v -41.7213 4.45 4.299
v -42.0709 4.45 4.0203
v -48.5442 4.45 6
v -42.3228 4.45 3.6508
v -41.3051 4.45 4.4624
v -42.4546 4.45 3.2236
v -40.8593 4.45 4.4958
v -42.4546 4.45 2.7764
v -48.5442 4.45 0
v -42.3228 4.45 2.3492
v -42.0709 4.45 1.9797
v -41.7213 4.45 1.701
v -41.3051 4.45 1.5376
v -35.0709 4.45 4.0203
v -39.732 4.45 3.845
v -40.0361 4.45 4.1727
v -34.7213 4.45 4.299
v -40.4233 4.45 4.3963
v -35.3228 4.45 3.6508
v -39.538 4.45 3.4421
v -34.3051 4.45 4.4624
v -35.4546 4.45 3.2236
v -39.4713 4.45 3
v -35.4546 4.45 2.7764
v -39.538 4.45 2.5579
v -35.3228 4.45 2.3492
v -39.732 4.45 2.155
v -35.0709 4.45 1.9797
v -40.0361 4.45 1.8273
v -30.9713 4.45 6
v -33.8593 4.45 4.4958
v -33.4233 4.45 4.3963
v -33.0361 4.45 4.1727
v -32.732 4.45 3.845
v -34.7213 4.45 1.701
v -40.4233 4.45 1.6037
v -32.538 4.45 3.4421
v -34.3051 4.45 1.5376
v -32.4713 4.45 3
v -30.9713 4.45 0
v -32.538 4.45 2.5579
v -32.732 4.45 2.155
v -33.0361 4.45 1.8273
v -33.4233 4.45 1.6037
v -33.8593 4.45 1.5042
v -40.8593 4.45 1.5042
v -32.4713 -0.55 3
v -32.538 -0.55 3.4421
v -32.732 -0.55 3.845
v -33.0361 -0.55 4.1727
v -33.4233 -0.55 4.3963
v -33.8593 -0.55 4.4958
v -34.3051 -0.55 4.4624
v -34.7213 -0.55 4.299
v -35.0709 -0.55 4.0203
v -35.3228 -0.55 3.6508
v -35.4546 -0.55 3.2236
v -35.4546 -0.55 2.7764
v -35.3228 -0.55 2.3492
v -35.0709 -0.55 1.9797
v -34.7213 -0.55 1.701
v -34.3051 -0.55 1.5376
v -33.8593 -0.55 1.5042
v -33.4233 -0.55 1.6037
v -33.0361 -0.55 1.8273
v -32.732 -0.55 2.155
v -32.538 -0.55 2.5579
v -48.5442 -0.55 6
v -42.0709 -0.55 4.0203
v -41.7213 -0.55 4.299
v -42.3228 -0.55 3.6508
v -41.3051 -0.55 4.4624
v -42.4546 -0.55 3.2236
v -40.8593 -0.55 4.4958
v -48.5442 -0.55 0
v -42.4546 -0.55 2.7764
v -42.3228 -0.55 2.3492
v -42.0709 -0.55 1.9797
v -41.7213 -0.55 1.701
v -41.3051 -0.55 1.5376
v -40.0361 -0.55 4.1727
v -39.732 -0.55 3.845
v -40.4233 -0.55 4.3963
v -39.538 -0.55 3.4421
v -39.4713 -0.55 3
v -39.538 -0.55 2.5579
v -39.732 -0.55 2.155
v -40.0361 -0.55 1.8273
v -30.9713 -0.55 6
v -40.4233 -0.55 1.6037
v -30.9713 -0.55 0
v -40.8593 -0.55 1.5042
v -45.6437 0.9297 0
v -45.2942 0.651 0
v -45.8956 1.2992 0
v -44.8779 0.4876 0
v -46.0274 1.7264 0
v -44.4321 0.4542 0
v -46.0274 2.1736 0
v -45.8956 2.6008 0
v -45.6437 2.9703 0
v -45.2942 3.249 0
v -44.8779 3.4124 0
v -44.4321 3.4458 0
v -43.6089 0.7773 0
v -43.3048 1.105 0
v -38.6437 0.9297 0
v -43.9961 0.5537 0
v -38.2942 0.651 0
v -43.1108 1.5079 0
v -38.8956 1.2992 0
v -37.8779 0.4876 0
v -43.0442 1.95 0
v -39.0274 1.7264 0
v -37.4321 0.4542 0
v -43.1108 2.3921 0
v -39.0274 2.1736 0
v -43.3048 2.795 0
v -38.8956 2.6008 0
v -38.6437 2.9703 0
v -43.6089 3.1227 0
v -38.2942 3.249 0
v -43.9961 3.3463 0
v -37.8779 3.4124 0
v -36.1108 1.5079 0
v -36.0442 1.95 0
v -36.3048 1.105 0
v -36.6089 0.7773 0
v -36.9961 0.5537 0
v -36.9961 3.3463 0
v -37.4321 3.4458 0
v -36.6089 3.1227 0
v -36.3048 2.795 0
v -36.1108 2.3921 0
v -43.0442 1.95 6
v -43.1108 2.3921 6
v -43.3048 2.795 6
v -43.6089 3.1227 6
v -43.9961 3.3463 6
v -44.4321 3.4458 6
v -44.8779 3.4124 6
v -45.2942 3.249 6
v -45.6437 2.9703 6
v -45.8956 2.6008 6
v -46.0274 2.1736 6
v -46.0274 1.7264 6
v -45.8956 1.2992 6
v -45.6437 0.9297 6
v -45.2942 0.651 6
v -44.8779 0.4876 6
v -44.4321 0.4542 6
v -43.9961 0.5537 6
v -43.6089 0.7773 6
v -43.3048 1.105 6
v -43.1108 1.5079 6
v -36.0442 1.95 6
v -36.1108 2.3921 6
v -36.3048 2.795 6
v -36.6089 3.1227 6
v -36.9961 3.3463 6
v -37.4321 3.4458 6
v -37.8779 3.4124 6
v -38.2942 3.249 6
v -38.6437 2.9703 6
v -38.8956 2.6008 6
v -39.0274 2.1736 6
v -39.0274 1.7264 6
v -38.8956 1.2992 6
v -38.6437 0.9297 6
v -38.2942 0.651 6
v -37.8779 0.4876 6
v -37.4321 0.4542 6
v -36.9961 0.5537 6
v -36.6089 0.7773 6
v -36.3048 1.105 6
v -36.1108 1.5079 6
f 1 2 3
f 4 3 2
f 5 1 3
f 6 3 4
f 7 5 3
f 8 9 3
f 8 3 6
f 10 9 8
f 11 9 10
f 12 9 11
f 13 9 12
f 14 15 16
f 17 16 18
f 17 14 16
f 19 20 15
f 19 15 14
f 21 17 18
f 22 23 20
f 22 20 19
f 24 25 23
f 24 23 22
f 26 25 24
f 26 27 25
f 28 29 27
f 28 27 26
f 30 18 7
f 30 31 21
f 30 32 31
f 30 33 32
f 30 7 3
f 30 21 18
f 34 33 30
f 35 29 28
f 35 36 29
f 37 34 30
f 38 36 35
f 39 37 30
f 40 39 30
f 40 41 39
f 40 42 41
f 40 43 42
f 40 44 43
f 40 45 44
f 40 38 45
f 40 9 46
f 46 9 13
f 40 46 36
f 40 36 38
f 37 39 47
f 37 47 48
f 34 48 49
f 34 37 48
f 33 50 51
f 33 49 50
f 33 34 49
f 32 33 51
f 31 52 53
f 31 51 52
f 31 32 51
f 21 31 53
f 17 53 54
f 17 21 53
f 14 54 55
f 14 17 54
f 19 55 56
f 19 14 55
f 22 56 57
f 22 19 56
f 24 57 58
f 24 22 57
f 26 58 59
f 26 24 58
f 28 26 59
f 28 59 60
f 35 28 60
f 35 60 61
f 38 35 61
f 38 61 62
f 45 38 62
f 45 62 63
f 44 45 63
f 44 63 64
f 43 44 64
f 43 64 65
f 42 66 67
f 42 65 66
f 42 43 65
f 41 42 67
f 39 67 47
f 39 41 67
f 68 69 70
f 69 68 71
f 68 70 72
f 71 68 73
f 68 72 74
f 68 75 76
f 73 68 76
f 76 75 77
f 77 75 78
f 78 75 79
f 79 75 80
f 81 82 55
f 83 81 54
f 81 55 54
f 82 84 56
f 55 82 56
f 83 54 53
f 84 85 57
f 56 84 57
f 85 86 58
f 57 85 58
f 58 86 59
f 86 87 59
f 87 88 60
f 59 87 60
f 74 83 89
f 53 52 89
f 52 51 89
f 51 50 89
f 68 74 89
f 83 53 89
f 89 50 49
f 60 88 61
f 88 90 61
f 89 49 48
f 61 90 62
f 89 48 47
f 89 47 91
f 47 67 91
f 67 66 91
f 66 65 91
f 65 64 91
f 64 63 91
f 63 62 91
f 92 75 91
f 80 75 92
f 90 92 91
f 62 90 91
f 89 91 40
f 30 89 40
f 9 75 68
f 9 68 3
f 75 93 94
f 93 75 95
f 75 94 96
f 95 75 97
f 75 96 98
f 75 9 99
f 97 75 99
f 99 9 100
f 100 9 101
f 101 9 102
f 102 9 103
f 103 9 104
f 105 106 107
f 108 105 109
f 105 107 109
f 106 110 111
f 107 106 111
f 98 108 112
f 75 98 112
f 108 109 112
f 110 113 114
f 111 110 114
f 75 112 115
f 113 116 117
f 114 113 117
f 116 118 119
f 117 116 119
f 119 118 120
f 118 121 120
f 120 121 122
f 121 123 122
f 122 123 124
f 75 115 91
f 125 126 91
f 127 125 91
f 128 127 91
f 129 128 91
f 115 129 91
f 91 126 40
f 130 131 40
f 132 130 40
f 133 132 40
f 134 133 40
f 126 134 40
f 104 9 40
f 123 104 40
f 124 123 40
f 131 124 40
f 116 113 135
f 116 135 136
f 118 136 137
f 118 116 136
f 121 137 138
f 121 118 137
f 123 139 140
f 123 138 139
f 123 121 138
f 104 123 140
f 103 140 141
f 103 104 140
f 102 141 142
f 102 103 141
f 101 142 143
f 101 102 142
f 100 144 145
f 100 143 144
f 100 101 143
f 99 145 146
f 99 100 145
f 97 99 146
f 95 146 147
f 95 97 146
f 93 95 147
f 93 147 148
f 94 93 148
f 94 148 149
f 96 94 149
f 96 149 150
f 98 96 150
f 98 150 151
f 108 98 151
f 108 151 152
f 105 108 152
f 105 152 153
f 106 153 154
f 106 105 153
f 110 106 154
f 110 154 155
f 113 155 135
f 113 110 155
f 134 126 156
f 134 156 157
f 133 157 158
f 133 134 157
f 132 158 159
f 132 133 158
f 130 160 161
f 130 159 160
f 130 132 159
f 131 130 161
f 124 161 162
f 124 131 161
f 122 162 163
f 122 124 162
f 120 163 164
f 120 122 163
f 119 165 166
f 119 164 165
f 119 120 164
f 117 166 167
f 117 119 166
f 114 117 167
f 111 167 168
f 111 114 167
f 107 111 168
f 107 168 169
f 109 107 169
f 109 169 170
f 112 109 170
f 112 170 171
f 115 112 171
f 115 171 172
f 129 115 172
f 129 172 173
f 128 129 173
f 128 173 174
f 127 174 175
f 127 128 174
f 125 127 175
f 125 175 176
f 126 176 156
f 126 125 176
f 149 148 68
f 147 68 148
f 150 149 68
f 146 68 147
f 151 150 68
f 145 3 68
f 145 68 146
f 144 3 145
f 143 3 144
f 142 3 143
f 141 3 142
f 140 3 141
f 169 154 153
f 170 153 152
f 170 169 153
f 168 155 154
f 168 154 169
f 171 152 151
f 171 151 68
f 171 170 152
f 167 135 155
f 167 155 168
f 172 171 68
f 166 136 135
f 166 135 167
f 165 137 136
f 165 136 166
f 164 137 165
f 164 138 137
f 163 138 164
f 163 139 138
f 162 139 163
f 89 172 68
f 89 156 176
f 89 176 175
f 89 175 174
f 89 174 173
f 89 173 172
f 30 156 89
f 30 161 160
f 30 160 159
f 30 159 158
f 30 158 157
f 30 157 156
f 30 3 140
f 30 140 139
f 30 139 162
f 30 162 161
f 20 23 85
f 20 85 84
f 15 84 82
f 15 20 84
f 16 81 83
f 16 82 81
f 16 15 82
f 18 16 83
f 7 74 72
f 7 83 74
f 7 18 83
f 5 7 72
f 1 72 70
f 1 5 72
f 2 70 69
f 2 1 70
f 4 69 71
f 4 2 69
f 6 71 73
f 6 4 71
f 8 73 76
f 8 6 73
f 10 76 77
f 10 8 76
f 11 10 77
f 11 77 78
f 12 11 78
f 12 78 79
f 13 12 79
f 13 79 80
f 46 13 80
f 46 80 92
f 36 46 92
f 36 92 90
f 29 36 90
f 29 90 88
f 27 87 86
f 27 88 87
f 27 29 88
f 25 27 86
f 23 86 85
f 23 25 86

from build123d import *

# Parameters (mm, degrees)
SKETCH_5_W               = 17.572810229
SKETCH_5_H               = 5
EXTRUDE_1_DEPTH          = 6
CUT_EXTRUDE_1_DEPTH      = 50.115553238
CUT_EXTRUDE_1_DEPTH_BACK = 50.115553238
SKETCH_6_R               = 1.5
CUT_EXTRUDE_2_DEPTH      = 50.168435707
CUT_EXTRUDE_2_DEPTH_BACK = 50.168435707
SKETCH_7_R               = 1.5


with BuildPart() as part:
    # 草图5 → 凸台-拉伸1 (new body)
    with BuildSketch(Plane.XY):
        with Locations((-39.757750763, 1.95)):
            Rectangle(SKETCH_5_W, SKETCH_5_H)
    extrude(amount=EXTRUDE_1_DEPTH)

    # 草图6 → 切除-拉伸1 (cut, two sides: drawn at the far end of the back side and taken through both)
    with BuildSketch(Plane.XY.offset(6).offset(-CUT_EXTRUDE_1_DEPTH_BACK)):
        with Locations((-37.544155877, 1.95)):
            Circle(SKETCH_6_R)
        with Locations((-44.544155877, 1.95)):
            Circle(SKETCH_6_R)
    extrude(amount=CUT_EXTRUDE_1_DEPTH + CUT_EXTRUDE_1_DEPTH_BACK, mode=Mode.SUBTRACT)

    # 草图7 → 切除-拉伸2 (cut, two sides: drawn at the far end of the back side and taken through both)
    with BuildSketch(Plane.XZ.offset(0.55).offset(-CUT_EXTRUDE_2_DEPTH_BACK)):
        with Locations((-40.971345648, 3)):
            Circle(SKETCH_7_R)
        with Locations((-33.971345648, 3)):
            Circle(SKETCH_7_R)
    extrude(amount=CUT_EXTRUDE_2_DEPTH + CUT_EXTRUDE_2_DEPTH_BACK, mode=Mode.SUBTRACT)


solid = part.part
